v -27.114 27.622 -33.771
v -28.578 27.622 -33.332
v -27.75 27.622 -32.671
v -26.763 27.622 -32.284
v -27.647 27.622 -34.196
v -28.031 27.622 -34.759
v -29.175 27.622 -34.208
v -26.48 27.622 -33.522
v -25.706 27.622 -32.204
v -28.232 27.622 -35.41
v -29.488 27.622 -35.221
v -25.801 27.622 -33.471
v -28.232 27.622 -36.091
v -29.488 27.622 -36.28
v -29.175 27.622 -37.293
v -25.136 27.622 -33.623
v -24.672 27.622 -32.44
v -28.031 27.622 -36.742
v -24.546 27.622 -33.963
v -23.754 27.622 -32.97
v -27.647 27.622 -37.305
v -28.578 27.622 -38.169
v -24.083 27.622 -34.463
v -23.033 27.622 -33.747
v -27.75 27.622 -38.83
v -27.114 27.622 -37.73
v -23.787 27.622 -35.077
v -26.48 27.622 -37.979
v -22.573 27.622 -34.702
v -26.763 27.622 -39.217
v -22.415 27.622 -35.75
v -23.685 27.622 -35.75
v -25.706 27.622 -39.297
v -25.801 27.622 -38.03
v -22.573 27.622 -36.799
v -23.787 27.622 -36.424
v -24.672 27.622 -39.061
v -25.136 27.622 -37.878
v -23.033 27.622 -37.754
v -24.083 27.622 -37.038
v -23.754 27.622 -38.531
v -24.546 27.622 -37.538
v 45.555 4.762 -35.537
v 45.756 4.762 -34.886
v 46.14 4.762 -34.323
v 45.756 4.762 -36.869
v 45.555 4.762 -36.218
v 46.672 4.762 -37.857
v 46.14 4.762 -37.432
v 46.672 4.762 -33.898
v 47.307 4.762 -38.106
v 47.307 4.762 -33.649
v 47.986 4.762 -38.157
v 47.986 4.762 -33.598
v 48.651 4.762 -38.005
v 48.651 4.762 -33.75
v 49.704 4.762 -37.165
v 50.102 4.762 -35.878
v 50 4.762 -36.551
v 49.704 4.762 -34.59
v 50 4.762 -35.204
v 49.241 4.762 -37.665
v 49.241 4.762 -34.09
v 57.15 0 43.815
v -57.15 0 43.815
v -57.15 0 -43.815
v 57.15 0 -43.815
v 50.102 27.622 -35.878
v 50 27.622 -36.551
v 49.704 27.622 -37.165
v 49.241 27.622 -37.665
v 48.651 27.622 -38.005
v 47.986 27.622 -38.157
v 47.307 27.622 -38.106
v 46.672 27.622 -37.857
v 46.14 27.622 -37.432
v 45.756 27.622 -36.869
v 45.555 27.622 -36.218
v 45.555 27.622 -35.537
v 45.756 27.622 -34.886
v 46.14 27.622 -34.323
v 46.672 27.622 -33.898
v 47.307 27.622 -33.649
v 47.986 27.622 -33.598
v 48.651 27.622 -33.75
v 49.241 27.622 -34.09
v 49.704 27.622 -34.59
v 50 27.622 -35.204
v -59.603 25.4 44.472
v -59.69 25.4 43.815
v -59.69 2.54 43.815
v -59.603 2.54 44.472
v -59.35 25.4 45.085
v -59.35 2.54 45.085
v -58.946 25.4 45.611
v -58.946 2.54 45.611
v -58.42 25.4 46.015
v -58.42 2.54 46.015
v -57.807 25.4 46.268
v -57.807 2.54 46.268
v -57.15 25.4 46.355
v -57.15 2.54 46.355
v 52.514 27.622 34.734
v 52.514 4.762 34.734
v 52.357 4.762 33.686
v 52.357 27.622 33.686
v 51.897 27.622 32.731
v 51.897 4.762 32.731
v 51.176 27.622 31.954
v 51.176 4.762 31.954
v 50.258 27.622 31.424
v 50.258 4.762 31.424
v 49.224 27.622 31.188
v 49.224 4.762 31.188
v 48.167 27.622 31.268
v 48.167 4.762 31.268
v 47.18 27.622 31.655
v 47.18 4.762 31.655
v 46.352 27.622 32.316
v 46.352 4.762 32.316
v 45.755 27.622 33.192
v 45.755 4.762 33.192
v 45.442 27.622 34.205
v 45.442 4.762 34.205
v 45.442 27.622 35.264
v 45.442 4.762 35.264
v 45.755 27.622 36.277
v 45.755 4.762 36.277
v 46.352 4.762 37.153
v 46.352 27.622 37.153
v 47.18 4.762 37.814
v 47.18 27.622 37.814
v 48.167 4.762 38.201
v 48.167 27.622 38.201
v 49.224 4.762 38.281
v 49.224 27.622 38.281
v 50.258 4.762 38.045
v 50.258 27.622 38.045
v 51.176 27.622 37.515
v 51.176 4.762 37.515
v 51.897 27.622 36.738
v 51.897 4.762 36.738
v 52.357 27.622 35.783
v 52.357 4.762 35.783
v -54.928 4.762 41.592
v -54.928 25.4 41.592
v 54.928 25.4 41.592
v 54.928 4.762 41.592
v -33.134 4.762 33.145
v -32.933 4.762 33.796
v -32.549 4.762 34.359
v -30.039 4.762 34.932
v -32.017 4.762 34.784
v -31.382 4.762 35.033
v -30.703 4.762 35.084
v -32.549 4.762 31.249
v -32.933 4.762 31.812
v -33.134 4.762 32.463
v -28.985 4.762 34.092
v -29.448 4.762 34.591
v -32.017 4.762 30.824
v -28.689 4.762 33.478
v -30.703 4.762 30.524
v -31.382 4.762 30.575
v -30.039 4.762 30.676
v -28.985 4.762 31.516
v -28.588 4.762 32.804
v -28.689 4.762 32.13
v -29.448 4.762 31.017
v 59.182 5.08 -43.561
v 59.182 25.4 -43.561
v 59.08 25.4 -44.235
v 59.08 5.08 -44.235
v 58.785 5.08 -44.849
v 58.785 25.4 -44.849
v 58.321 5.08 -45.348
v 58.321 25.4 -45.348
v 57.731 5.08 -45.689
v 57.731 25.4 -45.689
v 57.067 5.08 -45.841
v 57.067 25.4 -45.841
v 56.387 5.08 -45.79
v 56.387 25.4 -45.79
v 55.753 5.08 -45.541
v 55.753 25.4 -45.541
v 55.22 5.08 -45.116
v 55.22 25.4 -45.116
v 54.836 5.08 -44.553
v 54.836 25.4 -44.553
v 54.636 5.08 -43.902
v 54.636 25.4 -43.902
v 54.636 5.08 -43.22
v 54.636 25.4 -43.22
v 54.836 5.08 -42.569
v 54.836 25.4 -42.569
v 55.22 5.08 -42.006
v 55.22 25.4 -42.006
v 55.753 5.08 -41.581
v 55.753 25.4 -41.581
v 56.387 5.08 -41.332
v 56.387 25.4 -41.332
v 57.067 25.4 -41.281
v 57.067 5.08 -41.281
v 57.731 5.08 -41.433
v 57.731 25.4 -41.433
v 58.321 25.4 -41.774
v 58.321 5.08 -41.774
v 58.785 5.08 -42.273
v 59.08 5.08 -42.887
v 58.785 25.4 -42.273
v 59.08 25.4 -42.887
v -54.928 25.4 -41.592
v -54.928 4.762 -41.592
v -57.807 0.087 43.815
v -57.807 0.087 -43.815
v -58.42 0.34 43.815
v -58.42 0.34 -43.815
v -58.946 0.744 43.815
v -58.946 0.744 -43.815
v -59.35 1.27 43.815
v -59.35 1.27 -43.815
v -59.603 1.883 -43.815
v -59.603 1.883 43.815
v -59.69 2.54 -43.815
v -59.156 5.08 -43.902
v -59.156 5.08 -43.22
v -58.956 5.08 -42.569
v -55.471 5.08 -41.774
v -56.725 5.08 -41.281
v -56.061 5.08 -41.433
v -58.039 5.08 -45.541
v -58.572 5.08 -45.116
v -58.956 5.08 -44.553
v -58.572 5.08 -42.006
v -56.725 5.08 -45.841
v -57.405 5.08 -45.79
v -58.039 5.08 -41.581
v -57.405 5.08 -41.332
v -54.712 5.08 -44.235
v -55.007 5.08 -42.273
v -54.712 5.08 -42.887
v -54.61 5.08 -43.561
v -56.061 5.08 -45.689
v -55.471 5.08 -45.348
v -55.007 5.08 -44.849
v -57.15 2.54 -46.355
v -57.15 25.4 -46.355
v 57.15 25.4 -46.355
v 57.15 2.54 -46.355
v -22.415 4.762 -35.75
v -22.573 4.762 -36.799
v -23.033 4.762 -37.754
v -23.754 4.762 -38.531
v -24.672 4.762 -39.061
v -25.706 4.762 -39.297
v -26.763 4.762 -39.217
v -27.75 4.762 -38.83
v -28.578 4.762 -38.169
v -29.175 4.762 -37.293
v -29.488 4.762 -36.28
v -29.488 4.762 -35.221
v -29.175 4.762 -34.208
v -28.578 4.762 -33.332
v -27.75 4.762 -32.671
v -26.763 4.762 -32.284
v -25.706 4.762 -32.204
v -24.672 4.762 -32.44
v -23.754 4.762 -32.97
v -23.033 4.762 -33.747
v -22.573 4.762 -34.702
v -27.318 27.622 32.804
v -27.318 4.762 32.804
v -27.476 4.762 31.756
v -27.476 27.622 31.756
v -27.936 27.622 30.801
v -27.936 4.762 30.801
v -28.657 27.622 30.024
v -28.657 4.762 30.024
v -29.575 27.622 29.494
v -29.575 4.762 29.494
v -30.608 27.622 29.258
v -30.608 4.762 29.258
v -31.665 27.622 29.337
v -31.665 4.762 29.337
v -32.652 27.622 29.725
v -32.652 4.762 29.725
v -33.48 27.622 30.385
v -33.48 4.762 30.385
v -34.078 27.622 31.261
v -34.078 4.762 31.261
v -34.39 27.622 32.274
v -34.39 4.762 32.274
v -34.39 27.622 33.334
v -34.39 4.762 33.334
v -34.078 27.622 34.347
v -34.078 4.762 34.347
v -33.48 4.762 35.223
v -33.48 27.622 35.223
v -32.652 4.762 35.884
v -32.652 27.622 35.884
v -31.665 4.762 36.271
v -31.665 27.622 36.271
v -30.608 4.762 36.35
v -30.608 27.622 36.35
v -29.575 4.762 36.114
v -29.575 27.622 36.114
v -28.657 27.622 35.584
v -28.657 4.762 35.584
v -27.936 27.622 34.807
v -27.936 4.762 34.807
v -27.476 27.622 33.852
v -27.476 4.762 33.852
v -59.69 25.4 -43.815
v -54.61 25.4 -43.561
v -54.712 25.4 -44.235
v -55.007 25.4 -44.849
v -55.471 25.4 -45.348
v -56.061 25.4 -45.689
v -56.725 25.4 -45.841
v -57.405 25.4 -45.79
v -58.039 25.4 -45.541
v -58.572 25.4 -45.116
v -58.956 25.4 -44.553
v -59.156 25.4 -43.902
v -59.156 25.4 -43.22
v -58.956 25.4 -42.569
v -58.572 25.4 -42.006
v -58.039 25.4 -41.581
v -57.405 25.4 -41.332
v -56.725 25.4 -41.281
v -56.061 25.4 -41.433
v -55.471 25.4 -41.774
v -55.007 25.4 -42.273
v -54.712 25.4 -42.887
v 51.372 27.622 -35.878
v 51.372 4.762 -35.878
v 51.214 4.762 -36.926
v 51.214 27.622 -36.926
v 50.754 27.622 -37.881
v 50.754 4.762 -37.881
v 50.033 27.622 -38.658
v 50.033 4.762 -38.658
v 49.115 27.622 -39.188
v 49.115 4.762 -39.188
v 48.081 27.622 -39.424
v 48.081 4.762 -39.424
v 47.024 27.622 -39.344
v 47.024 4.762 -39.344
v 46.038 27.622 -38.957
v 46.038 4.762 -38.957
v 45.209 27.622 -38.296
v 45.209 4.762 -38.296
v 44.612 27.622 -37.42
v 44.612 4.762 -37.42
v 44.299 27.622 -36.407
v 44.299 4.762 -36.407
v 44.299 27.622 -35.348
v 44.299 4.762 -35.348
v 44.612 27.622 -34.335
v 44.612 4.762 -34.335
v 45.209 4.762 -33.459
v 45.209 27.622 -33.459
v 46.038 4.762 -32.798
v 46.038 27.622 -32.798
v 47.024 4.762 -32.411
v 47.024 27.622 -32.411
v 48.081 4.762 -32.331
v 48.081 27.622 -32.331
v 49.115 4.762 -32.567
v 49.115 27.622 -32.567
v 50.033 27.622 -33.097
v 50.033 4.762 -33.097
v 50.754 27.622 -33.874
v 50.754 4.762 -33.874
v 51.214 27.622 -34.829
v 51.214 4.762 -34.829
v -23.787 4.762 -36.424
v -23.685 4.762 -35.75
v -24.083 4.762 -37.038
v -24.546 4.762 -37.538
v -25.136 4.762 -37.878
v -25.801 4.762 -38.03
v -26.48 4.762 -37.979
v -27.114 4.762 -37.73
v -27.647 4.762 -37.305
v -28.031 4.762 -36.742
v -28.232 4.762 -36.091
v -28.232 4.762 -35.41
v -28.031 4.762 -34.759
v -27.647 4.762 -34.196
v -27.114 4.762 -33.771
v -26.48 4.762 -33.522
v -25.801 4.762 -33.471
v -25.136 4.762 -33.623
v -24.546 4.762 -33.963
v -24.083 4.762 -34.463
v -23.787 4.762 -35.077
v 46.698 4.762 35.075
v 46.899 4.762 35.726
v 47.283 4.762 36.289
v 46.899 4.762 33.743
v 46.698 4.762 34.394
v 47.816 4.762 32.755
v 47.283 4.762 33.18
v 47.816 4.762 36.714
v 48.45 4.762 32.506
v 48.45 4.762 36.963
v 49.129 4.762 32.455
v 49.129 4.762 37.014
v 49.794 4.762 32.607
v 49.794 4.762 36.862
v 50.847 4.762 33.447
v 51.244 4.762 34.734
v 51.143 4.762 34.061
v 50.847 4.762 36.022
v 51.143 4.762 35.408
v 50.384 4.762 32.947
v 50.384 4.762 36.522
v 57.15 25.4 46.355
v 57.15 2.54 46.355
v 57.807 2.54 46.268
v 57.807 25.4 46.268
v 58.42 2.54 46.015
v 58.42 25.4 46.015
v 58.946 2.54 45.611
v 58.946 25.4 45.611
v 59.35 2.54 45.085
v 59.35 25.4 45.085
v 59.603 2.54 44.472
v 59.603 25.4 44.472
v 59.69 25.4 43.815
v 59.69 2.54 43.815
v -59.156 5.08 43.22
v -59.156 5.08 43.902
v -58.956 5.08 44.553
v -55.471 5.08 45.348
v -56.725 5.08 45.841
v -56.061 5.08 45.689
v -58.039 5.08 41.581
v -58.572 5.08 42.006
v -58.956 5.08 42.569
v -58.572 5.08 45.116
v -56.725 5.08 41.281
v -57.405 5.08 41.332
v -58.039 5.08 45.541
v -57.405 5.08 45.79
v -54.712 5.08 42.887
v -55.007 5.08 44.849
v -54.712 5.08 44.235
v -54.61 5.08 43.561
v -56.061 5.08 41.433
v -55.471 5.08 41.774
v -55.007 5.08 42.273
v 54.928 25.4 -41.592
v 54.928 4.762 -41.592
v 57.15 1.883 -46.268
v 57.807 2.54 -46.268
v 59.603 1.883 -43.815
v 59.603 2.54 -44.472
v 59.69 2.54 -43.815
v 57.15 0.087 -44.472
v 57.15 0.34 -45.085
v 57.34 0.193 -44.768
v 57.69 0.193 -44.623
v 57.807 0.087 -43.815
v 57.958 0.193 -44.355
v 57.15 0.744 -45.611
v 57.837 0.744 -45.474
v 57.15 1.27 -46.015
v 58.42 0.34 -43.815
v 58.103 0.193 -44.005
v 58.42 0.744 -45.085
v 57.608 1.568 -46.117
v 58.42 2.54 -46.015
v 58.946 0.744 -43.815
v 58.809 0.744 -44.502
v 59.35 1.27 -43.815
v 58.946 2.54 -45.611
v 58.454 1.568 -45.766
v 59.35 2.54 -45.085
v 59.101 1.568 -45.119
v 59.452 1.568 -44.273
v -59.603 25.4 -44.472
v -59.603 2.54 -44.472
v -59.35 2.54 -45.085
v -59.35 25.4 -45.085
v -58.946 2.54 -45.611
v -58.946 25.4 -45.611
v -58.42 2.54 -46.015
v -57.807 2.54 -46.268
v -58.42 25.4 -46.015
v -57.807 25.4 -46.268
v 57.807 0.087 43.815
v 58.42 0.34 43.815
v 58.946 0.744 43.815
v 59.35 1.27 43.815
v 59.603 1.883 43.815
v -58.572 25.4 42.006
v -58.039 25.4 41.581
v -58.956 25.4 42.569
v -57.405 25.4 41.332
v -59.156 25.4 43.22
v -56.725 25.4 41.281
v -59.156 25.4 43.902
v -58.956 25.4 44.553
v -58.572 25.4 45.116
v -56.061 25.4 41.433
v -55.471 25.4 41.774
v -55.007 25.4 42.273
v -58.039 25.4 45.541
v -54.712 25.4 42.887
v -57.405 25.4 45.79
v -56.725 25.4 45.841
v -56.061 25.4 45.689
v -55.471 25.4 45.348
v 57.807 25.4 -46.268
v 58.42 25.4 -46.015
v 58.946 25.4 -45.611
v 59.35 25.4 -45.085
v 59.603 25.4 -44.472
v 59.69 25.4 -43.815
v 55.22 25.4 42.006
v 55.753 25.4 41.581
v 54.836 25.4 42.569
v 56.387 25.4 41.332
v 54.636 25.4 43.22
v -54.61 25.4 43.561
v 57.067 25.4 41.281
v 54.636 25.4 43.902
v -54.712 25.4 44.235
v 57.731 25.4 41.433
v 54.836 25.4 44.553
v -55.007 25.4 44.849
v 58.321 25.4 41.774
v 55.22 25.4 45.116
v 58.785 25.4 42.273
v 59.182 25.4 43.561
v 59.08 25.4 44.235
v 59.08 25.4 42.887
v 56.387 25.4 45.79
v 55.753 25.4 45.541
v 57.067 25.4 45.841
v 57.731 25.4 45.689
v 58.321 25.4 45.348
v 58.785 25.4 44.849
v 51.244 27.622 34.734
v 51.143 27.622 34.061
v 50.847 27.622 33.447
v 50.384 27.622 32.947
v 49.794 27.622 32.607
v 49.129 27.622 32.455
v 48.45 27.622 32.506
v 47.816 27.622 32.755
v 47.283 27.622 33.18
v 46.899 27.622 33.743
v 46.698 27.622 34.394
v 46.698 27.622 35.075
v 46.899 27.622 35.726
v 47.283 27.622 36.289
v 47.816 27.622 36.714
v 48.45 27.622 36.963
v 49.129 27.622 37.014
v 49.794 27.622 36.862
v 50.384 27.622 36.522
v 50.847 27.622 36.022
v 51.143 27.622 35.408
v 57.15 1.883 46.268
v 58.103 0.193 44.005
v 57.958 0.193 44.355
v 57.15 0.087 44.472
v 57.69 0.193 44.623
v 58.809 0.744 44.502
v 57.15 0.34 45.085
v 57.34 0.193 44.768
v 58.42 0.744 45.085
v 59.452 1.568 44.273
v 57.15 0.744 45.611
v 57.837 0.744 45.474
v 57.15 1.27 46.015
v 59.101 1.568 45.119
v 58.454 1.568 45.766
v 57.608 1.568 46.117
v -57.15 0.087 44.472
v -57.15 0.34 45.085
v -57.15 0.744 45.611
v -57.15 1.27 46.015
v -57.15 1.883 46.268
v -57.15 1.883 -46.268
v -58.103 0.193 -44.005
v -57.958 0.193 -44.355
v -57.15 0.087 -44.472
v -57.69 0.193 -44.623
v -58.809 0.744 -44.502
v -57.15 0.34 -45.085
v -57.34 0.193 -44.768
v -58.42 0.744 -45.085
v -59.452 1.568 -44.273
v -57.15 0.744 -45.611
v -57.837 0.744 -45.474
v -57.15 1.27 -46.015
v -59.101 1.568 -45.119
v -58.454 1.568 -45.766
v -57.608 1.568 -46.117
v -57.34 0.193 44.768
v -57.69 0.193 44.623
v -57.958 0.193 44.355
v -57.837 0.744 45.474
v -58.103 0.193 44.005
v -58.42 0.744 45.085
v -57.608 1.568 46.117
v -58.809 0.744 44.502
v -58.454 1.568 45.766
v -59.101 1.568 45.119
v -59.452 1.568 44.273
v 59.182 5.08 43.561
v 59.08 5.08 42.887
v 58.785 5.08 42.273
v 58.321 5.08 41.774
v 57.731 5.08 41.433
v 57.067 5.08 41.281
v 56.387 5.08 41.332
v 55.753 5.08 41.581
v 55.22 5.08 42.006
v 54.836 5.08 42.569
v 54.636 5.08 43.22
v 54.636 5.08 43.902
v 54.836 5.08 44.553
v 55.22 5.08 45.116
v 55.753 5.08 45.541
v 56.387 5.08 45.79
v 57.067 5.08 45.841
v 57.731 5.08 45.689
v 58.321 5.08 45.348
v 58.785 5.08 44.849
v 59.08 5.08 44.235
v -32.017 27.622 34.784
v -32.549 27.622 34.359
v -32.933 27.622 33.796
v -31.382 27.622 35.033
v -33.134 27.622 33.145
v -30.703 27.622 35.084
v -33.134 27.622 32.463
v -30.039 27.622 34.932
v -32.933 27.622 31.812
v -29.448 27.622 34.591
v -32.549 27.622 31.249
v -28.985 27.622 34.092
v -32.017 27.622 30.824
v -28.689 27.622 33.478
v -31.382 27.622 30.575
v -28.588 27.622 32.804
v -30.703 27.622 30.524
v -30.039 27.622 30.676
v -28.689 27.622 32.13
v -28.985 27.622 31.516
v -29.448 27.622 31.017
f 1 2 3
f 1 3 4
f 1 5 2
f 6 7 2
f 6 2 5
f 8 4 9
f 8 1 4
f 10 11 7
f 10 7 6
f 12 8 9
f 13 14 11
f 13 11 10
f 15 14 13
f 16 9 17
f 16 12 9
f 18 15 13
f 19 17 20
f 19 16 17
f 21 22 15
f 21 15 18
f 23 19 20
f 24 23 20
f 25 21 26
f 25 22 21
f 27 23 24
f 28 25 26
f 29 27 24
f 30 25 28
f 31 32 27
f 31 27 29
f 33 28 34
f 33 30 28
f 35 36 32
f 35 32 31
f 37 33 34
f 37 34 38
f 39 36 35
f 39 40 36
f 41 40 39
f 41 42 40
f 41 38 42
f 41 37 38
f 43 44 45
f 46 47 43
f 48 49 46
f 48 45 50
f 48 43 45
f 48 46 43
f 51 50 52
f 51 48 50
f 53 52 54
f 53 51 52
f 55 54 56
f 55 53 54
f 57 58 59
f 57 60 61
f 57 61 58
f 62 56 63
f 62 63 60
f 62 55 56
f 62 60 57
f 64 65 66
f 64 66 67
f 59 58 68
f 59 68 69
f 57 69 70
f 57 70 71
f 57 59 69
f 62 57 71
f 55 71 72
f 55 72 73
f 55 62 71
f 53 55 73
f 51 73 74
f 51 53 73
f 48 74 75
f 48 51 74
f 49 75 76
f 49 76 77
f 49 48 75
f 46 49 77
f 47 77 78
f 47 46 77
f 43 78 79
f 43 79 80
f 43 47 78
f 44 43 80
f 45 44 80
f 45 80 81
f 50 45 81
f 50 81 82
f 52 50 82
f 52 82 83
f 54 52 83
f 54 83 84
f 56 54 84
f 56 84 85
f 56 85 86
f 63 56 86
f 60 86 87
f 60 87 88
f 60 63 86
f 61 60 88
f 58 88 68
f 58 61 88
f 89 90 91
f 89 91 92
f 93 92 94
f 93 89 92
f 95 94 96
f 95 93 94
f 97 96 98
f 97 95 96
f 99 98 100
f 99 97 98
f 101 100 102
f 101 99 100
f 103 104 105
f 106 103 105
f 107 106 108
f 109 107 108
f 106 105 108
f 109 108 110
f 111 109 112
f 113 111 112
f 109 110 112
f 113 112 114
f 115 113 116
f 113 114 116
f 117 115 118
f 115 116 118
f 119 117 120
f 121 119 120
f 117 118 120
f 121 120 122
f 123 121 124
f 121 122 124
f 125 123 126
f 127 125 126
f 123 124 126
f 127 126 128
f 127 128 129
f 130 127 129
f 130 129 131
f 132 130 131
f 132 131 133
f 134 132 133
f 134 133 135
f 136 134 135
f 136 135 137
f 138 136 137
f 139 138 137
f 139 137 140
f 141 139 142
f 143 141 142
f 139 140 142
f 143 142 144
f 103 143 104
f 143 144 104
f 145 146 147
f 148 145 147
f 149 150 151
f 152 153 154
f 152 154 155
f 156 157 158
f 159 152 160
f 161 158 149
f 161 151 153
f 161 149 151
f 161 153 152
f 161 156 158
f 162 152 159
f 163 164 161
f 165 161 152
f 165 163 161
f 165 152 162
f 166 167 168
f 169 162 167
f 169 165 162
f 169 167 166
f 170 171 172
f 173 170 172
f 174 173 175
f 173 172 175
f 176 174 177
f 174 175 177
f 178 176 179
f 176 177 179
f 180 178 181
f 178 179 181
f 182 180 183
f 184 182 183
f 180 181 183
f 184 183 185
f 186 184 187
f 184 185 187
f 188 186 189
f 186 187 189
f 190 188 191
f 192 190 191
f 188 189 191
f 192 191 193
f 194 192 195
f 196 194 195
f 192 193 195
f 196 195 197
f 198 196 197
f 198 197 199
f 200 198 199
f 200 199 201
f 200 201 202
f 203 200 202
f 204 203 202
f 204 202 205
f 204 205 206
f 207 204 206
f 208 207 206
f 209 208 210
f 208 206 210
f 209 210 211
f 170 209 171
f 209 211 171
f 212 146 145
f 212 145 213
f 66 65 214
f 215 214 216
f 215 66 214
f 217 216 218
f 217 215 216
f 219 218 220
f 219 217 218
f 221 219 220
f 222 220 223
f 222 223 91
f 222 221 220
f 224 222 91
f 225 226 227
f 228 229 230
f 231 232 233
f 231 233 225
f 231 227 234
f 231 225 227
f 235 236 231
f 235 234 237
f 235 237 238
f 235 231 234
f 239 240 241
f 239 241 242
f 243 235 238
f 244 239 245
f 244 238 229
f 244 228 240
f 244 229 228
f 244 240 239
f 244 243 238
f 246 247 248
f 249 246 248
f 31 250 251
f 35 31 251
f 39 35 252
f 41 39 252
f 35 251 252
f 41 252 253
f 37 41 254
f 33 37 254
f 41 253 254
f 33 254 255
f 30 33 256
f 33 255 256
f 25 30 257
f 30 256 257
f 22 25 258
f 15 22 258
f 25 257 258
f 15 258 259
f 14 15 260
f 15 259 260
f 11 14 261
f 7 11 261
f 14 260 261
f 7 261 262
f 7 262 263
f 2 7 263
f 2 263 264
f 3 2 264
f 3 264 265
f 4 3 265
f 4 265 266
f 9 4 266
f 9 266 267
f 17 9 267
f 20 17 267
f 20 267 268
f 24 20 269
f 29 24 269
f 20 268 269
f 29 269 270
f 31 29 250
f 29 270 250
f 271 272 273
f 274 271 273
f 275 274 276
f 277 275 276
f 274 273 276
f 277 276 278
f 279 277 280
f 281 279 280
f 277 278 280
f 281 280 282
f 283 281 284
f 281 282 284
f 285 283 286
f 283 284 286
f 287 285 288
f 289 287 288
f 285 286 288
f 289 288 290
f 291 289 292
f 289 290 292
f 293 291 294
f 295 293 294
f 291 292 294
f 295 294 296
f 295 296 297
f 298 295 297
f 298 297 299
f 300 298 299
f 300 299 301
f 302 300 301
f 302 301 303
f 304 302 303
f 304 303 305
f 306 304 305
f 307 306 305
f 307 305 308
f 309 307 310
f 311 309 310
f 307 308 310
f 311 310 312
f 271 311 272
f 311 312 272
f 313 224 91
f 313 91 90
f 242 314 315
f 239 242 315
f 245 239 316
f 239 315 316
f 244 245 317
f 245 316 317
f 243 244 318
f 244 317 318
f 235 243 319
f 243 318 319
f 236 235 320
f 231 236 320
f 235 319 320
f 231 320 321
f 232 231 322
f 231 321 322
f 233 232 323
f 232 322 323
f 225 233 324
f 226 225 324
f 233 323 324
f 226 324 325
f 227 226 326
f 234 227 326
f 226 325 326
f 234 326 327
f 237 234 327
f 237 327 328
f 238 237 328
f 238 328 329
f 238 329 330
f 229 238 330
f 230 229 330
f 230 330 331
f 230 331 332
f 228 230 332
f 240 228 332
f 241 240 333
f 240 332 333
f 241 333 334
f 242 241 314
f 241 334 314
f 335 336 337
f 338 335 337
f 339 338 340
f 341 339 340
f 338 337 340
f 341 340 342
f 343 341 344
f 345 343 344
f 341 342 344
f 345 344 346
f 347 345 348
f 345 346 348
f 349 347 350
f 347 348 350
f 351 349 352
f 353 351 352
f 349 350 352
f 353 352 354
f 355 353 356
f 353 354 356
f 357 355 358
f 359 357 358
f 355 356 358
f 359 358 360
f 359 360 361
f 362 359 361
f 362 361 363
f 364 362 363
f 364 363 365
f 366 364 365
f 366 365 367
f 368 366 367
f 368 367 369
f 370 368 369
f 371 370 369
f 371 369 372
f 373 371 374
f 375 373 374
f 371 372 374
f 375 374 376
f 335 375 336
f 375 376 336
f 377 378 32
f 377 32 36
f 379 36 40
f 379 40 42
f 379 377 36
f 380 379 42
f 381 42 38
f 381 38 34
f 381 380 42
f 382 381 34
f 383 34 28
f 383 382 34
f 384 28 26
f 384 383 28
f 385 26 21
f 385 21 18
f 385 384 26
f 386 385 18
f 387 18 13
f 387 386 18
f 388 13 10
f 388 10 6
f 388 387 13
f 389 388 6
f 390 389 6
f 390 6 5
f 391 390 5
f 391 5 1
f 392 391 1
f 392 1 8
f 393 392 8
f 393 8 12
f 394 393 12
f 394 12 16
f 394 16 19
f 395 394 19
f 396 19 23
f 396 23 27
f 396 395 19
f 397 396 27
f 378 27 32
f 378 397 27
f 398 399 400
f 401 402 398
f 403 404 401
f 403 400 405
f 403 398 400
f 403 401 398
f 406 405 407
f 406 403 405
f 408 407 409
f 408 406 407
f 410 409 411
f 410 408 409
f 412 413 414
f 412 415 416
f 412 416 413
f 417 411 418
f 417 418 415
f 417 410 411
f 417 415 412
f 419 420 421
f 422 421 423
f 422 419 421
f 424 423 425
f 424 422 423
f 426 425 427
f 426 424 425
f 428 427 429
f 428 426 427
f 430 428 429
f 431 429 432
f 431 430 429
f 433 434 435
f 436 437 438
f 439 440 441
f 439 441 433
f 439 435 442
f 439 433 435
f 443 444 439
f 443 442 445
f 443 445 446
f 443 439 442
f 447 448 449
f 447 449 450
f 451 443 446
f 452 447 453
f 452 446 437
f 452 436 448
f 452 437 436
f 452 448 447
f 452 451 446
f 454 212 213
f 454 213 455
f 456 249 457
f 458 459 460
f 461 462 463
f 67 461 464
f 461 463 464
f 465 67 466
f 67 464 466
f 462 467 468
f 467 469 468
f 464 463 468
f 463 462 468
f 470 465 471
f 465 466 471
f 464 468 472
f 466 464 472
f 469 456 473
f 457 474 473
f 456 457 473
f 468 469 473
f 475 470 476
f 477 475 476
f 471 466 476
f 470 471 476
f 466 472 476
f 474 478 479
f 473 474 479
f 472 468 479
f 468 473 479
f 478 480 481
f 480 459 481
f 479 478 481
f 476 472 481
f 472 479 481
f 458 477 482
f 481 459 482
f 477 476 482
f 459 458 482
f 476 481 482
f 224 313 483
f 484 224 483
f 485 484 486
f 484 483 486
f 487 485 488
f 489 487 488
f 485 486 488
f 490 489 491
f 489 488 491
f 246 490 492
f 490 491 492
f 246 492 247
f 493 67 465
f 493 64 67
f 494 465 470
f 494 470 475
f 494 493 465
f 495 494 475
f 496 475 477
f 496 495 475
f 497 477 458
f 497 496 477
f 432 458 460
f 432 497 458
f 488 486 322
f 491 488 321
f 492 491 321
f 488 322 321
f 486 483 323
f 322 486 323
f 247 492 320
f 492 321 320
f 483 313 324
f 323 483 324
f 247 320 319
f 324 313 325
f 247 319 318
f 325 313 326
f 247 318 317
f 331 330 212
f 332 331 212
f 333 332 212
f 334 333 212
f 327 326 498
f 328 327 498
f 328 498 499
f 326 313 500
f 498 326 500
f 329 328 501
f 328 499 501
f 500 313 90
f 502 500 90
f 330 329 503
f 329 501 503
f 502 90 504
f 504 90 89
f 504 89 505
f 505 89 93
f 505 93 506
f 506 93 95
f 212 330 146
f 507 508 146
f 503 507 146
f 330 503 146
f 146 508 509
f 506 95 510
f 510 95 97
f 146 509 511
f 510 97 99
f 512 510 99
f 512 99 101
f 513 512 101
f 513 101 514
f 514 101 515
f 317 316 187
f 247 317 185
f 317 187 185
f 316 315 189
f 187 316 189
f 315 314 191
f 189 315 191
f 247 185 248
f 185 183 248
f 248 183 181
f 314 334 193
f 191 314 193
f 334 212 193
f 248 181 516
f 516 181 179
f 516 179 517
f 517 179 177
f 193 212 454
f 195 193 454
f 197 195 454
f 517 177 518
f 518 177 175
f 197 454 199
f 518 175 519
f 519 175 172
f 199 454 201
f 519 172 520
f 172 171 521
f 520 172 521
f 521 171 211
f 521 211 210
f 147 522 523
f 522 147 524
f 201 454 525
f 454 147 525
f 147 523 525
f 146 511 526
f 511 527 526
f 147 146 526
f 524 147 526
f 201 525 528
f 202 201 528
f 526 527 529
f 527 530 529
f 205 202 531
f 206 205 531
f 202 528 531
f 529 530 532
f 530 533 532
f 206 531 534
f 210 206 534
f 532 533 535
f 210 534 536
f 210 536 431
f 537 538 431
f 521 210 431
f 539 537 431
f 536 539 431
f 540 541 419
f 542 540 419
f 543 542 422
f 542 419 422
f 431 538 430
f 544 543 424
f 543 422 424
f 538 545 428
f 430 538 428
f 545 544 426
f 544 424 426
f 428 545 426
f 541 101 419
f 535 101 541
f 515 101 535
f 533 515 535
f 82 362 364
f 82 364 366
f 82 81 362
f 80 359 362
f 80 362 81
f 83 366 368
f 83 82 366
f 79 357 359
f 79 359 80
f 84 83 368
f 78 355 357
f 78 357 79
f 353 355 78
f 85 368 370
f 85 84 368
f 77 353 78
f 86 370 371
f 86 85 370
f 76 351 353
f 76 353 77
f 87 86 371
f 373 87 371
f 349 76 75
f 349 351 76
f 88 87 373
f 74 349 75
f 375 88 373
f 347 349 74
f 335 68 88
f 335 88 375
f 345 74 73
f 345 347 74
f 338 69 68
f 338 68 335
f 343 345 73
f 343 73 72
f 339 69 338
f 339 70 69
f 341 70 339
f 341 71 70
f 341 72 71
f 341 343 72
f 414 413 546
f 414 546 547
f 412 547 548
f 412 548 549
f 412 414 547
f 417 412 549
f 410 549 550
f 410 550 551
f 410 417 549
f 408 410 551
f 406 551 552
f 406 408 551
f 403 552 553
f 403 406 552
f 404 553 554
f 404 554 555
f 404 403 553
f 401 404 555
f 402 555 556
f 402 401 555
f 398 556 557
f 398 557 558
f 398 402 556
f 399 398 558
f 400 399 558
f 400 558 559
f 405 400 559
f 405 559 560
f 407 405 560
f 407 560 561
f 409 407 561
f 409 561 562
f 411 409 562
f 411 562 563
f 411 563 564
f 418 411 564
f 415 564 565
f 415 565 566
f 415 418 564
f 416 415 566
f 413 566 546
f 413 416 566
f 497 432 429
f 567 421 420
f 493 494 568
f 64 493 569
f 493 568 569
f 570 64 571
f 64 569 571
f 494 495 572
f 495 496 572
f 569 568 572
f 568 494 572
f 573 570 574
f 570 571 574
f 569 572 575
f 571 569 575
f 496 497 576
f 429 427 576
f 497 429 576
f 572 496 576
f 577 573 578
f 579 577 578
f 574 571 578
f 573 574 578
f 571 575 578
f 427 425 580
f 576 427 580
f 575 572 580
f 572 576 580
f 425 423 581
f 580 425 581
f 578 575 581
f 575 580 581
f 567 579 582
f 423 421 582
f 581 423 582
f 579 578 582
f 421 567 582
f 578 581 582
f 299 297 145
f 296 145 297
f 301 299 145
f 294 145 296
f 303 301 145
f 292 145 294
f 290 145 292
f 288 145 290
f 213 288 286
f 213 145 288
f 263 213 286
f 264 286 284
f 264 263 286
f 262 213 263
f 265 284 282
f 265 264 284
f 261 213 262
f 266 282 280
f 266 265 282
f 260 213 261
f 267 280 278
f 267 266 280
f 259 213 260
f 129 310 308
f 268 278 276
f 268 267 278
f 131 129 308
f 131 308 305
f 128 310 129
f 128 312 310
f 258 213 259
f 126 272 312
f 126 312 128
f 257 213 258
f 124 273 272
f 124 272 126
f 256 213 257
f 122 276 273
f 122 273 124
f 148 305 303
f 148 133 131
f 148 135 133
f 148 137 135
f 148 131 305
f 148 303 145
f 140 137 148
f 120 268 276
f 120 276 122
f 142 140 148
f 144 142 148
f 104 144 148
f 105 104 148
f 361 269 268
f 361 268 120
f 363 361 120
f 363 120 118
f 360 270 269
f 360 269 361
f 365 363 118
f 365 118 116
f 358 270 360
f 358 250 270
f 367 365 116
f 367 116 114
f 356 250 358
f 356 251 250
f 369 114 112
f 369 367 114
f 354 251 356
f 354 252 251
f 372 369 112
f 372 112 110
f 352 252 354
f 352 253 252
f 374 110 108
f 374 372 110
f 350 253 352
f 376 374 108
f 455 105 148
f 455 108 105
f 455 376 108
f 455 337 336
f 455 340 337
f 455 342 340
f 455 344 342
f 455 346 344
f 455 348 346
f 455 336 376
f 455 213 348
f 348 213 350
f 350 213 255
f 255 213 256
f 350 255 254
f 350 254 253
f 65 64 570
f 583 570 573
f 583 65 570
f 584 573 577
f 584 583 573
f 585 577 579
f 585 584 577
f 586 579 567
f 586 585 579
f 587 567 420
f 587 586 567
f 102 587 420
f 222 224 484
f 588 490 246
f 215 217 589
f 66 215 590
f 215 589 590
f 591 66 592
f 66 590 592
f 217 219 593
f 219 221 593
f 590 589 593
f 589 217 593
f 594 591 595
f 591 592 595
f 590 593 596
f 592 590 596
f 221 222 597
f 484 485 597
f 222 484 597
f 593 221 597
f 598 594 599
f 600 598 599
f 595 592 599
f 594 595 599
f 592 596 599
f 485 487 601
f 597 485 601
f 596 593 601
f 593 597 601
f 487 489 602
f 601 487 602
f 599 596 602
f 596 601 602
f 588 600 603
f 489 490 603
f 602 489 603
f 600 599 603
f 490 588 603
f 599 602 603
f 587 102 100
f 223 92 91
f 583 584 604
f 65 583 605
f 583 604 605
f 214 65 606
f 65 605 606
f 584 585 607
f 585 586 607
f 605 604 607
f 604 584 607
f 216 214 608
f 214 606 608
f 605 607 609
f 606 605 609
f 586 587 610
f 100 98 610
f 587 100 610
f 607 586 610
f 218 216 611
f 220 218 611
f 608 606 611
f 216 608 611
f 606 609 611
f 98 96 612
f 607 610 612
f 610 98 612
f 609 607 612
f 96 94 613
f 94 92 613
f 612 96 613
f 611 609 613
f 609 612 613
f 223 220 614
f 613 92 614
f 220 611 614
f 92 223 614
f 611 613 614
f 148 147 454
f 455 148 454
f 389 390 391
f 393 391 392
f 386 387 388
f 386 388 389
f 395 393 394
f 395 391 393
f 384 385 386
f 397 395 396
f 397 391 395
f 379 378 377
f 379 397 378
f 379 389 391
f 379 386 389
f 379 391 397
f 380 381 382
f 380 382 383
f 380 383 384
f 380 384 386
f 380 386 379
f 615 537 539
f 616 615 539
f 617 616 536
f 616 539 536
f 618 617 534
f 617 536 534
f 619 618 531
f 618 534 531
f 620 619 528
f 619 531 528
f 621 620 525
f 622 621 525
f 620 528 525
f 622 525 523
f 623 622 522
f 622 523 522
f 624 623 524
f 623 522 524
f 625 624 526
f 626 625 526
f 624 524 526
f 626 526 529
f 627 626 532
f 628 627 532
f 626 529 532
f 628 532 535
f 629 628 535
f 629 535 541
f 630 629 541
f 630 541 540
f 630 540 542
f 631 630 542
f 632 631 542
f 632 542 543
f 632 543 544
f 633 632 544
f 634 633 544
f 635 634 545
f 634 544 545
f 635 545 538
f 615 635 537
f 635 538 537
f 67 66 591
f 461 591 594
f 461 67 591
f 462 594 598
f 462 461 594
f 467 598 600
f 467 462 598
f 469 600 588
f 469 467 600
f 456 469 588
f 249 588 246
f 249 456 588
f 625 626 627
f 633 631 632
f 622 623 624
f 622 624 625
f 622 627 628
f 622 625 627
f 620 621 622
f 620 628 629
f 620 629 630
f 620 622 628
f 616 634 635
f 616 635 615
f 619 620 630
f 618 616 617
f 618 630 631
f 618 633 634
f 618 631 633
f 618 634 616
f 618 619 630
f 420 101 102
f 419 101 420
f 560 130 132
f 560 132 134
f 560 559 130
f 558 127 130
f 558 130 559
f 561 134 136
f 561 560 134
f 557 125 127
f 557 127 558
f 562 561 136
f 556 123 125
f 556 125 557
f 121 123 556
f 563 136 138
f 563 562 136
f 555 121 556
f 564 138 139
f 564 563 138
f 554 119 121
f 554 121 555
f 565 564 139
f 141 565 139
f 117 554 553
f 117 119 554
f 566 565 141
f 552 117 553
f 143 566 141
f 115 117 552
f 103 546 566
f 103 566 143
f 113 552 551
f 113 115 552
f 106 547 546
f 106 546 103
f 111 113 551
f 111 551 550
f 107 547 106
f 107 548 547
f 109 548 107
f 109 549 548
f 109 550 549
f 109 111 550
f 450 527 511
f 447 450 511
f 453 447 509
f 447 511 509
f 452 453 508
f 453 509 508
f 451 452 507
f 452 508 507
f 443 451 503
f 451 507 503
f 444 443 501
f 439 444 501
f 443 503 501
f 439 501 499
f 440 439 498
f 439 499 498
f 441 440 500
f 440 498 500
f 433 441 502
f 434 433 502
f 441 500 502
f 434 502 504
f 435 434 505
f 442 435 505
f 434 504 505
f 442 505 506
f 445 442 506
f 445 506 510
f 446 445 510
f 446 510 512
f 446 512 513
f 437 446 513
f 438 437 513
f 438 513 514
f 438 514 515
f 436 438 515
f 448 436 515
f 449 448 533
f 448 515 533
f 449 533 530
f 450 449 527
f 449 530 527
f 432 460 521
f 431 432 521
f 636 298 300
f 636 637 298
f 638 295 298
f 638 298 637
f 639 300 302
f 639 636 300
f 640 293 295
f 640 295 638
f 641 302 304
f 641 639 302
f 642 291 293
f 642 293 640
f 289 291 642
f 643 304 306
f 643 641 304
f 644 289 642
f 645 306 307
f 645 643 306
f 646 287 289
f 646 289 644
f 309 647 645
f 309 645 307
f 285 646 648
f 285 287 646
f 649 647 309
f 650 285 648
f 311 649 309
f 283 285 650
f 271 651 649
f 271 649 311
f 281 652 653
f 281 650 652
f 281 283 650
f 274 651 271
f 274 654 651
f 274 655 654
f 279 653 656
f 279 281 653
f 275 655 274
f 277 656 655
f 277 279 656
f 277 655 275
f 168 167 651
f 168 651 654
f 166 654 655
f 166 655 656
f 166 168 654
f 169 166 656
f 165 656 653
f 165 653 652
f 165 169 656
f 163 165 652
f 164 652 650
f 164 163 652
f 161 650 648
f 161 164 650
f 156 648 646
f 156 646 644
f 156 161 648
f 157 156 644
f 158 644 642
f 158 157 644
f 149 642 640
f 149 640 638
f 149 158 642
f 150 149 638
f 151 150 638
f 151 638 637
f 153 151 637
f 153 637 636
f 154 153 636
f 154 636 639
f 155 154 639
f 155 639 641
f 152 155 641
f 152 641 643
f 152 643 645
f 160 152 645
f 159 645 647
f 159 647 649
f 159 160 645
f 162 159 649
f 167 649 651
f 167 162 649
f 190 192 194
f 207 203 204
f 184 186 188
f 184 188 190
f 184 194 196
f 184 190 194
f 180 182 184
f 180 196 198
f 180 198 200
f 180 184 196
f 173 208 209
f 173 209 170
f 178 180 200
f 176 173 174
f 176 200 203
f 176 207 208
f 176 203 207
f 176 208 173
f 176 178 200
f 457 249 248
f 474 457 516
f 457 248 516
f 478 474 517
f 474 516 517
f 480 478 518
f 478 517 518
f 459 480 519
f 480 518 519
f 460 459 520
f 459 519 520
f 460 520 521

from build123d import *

# Parameters (mm, degrees)
SKETCH1_W           = 119.38
SKETCH1_H           = 25.4
BOSS_EXTRUDE1_DEPTH = 46.355
SKETCH2_W           = 109.855
SKETCH2_H           = 83.185
CUT_EXTRUDE1_DEPTH  = 20.6375
FILLET1_R           = 2.54
FILLET2_R           = 2.54
SKETCH8_R           = 2.286
CUT_EXTRUDE2_DEPTH  = 20.32
SKETCH16_R          = 2.286
CUT_EXTRUDE4_DEPTH  = 20.32
SKETCH17_R          = 2.286
CUT_EXTRUDE5_DEPTH  = 20.32
SKETCH18_R          = 2.286
CUT_EXTRUDE6_DEPTH  = 20.32
SKETCH9_R           = 3.556
SKETCH9_R_2         = 2.286
BOSS_EXTRUDE2_DEPTH = 22.86
SKETCH11_R          = 3.556
SKETCH11_R_2        = 2.286
BOSS_EXTRUDE3_DEPTH = 22.86
SKETCH12_R          = 3.556
SKETCH12_R_2        = 2.286
BOSS_EXTRUDE4_DEPTH = 22.86
SKETCH13_R          = 3.556
SKETCH13_R_2        = 2.286
BOSS_EXTRUDE5_DEPTH = 22.86


with BuildPart() as part:
    # Sketch1 → Boss-Extrude1 (new body, symmetric)
    with BuildSketch(Plane.XY):
        with Locations((0, 12.7)):
            Rectangle(SKETCH1_W, SKETCH1_H)
    extrude(amount=BOSS_EXTRUDE1_DEPTH, both=True)

    # Sketch2 → Cut-Extrude1 (cut)
    with BuildSketch(Plane(origin=(0, 25.4, 0), x_dir=(1, 0, 0), z_dir=(0, 1, 0))):
        Rectangle(SKETCH2_W, SKETCH2_H)
    extrude(amount=-CUT_EXTRUDE1_DEPTH, mode=Mode.SUBTRACT)

    # Fillet1
    fillet1_edges = [part.edges().sort_by_distance(p)[0] for p in [
        (59.69, 12.7, 46.355),
        (-59.69, 12.7, 46.355),
        (59.69, 12.7, -46.355),
        (-59.69, 12.7, -46.355),
    ]]
    fillet(fillet1_edges, radius=FILLET1_R)

    # Fillet2
    fillet2_edges = [part.edges().sort_by_distance(p)[0] for p in [
        (59.69, 0, 0),
        (0, 0, -46.355),
        (0, 0, 46.355),
        (-59.69, 0, 0),
        (58.946051224, 0, 45.611051224),
        (-58.946051224, 0, 45.611051224),
        (-58.946051224, 0, -45.611051224),
        (58.946051224, 0, -45.611051224),
    ]]
    fillet(fillet2_edges, radius=FILLET2_R)

    # Sketch8 → Cut-Extrude2 (cut)
    with BuildSketch(Plane(origin=(0, 25.4, 0), x_dir=(1, 0, 0), z_dir=(0, 1, 0))):
        with Locations((56.896, 43.561)):
            Circle(SKETCH8_R)
    extrude(amount=-CUT_EXTRUDE2_DEPTH, mode=Mode.SUBTRACT)

    # Sketch16 → Cut-Extrude4 (cut)
    with BuildSketch(Plane(origin=(0, 25.4, 0), x_dir=(1, 0, 0), z_dir=(0, 1, 0))):
        with Locations((-56.896, -43.561)):
            Circle(SKETCH16_R)
    extrude(amount=-CUT_EXTRUDE4_DEPTH, mode=Mode.SUBTRACT)

    # Sketch17 → Cut-Extrude5 (cut)
    with BuildSketch(Plane(origin=(0, 25.4, 0), x_dir=(1, 0, 0), z_dir=(0, 1, 0))):
        with Locations((56.896, -43.561)):
            Circle(SKETCH17_R)
    extrude(amount=-CUT_EXTRUDE5_DEPTH, mode=Mode.SUBTRACT)

    # Sketch18 → Cut-Extrude6 (cut)
    with BuildSketch(Plane(origin=(0, 25.4, 0), x_dir=(1, 0, 0), z_dir=(0, 1, 0))):
        with Locations((-56.896, 43.561)):
            Circle(SKETCH18_R)
    extrude(amount=-CUT_EXTRUDE6_DEPTH, mode=Mode.SUBTRACT)

    # Sketch9 → Boss-Extrude2 (add)
    with BuildSketch(Plane(origin=(0, 4.7625, 0), x_dir=(1, 0, 0), z_dir=(0, 1, 0))):
        with Locations((-25.9715, 35.7505)):
            Circle(SKETCH9_R)
        with Locations((-25.9715, 35.7505)):
            Circle(SKETCH9_R_2, mode=Mode.SUBTRACT)
    extrude(amount=BOSS_EXTRUDE2_DEPTH)

    # Sketch11 → Boss-Extrude3 (add)
    with BuildSketch(Plane(origin=(0, 4.7625, 0), x_dir=(1, 0, 0), z_dir=(0, 1, 0))):
        with Locations((-30.8737, -32.8041)):
            Circle(SKETCH11_R)
        with Locations((-30.8737, -32.8041)):
            Circle(SKETCH11_R_2, mode=Mode.SUBTRACT)
    extrude(amount=BOSS_EXTRUDE3_DEPTH)

    # Sketch12 → Boss-Extrude4 (add)
    with BuildSketch(Plane(origin=(0, 4.7625, 0), x_dir=(1, 0, 0), z_dir=(0, 1, 0))):
        with Locations((47.8155, 35.8775)):
            Circle(SKETCH12_R)
        with Locations((47.8155, 35.8775)):
            Circle(SKETCH12_R_2, mode=Mode.SUBTRACT)
    extrude(amount=BOSS_EXTRUDE4_DEPTH)

    # Sketch13 → Boss-Extrude5 (add)
    with BuildSketch(Plane(origin=(0, 4.7625, 0), x_dir=(1, 0, 0), z_dir=(0, 1, 0))):
        with Locations((48.9585, -34.7345)):
            Circle(SKETCH13_R)
        with Locations((48.9585, -34.7345)):
            Circle(SKETCH13_R_2, mode=Mode.SUBTRACT)
    extrude(amount=BOSS_EXTRUDE5_DEPTH)


solid = part.part
